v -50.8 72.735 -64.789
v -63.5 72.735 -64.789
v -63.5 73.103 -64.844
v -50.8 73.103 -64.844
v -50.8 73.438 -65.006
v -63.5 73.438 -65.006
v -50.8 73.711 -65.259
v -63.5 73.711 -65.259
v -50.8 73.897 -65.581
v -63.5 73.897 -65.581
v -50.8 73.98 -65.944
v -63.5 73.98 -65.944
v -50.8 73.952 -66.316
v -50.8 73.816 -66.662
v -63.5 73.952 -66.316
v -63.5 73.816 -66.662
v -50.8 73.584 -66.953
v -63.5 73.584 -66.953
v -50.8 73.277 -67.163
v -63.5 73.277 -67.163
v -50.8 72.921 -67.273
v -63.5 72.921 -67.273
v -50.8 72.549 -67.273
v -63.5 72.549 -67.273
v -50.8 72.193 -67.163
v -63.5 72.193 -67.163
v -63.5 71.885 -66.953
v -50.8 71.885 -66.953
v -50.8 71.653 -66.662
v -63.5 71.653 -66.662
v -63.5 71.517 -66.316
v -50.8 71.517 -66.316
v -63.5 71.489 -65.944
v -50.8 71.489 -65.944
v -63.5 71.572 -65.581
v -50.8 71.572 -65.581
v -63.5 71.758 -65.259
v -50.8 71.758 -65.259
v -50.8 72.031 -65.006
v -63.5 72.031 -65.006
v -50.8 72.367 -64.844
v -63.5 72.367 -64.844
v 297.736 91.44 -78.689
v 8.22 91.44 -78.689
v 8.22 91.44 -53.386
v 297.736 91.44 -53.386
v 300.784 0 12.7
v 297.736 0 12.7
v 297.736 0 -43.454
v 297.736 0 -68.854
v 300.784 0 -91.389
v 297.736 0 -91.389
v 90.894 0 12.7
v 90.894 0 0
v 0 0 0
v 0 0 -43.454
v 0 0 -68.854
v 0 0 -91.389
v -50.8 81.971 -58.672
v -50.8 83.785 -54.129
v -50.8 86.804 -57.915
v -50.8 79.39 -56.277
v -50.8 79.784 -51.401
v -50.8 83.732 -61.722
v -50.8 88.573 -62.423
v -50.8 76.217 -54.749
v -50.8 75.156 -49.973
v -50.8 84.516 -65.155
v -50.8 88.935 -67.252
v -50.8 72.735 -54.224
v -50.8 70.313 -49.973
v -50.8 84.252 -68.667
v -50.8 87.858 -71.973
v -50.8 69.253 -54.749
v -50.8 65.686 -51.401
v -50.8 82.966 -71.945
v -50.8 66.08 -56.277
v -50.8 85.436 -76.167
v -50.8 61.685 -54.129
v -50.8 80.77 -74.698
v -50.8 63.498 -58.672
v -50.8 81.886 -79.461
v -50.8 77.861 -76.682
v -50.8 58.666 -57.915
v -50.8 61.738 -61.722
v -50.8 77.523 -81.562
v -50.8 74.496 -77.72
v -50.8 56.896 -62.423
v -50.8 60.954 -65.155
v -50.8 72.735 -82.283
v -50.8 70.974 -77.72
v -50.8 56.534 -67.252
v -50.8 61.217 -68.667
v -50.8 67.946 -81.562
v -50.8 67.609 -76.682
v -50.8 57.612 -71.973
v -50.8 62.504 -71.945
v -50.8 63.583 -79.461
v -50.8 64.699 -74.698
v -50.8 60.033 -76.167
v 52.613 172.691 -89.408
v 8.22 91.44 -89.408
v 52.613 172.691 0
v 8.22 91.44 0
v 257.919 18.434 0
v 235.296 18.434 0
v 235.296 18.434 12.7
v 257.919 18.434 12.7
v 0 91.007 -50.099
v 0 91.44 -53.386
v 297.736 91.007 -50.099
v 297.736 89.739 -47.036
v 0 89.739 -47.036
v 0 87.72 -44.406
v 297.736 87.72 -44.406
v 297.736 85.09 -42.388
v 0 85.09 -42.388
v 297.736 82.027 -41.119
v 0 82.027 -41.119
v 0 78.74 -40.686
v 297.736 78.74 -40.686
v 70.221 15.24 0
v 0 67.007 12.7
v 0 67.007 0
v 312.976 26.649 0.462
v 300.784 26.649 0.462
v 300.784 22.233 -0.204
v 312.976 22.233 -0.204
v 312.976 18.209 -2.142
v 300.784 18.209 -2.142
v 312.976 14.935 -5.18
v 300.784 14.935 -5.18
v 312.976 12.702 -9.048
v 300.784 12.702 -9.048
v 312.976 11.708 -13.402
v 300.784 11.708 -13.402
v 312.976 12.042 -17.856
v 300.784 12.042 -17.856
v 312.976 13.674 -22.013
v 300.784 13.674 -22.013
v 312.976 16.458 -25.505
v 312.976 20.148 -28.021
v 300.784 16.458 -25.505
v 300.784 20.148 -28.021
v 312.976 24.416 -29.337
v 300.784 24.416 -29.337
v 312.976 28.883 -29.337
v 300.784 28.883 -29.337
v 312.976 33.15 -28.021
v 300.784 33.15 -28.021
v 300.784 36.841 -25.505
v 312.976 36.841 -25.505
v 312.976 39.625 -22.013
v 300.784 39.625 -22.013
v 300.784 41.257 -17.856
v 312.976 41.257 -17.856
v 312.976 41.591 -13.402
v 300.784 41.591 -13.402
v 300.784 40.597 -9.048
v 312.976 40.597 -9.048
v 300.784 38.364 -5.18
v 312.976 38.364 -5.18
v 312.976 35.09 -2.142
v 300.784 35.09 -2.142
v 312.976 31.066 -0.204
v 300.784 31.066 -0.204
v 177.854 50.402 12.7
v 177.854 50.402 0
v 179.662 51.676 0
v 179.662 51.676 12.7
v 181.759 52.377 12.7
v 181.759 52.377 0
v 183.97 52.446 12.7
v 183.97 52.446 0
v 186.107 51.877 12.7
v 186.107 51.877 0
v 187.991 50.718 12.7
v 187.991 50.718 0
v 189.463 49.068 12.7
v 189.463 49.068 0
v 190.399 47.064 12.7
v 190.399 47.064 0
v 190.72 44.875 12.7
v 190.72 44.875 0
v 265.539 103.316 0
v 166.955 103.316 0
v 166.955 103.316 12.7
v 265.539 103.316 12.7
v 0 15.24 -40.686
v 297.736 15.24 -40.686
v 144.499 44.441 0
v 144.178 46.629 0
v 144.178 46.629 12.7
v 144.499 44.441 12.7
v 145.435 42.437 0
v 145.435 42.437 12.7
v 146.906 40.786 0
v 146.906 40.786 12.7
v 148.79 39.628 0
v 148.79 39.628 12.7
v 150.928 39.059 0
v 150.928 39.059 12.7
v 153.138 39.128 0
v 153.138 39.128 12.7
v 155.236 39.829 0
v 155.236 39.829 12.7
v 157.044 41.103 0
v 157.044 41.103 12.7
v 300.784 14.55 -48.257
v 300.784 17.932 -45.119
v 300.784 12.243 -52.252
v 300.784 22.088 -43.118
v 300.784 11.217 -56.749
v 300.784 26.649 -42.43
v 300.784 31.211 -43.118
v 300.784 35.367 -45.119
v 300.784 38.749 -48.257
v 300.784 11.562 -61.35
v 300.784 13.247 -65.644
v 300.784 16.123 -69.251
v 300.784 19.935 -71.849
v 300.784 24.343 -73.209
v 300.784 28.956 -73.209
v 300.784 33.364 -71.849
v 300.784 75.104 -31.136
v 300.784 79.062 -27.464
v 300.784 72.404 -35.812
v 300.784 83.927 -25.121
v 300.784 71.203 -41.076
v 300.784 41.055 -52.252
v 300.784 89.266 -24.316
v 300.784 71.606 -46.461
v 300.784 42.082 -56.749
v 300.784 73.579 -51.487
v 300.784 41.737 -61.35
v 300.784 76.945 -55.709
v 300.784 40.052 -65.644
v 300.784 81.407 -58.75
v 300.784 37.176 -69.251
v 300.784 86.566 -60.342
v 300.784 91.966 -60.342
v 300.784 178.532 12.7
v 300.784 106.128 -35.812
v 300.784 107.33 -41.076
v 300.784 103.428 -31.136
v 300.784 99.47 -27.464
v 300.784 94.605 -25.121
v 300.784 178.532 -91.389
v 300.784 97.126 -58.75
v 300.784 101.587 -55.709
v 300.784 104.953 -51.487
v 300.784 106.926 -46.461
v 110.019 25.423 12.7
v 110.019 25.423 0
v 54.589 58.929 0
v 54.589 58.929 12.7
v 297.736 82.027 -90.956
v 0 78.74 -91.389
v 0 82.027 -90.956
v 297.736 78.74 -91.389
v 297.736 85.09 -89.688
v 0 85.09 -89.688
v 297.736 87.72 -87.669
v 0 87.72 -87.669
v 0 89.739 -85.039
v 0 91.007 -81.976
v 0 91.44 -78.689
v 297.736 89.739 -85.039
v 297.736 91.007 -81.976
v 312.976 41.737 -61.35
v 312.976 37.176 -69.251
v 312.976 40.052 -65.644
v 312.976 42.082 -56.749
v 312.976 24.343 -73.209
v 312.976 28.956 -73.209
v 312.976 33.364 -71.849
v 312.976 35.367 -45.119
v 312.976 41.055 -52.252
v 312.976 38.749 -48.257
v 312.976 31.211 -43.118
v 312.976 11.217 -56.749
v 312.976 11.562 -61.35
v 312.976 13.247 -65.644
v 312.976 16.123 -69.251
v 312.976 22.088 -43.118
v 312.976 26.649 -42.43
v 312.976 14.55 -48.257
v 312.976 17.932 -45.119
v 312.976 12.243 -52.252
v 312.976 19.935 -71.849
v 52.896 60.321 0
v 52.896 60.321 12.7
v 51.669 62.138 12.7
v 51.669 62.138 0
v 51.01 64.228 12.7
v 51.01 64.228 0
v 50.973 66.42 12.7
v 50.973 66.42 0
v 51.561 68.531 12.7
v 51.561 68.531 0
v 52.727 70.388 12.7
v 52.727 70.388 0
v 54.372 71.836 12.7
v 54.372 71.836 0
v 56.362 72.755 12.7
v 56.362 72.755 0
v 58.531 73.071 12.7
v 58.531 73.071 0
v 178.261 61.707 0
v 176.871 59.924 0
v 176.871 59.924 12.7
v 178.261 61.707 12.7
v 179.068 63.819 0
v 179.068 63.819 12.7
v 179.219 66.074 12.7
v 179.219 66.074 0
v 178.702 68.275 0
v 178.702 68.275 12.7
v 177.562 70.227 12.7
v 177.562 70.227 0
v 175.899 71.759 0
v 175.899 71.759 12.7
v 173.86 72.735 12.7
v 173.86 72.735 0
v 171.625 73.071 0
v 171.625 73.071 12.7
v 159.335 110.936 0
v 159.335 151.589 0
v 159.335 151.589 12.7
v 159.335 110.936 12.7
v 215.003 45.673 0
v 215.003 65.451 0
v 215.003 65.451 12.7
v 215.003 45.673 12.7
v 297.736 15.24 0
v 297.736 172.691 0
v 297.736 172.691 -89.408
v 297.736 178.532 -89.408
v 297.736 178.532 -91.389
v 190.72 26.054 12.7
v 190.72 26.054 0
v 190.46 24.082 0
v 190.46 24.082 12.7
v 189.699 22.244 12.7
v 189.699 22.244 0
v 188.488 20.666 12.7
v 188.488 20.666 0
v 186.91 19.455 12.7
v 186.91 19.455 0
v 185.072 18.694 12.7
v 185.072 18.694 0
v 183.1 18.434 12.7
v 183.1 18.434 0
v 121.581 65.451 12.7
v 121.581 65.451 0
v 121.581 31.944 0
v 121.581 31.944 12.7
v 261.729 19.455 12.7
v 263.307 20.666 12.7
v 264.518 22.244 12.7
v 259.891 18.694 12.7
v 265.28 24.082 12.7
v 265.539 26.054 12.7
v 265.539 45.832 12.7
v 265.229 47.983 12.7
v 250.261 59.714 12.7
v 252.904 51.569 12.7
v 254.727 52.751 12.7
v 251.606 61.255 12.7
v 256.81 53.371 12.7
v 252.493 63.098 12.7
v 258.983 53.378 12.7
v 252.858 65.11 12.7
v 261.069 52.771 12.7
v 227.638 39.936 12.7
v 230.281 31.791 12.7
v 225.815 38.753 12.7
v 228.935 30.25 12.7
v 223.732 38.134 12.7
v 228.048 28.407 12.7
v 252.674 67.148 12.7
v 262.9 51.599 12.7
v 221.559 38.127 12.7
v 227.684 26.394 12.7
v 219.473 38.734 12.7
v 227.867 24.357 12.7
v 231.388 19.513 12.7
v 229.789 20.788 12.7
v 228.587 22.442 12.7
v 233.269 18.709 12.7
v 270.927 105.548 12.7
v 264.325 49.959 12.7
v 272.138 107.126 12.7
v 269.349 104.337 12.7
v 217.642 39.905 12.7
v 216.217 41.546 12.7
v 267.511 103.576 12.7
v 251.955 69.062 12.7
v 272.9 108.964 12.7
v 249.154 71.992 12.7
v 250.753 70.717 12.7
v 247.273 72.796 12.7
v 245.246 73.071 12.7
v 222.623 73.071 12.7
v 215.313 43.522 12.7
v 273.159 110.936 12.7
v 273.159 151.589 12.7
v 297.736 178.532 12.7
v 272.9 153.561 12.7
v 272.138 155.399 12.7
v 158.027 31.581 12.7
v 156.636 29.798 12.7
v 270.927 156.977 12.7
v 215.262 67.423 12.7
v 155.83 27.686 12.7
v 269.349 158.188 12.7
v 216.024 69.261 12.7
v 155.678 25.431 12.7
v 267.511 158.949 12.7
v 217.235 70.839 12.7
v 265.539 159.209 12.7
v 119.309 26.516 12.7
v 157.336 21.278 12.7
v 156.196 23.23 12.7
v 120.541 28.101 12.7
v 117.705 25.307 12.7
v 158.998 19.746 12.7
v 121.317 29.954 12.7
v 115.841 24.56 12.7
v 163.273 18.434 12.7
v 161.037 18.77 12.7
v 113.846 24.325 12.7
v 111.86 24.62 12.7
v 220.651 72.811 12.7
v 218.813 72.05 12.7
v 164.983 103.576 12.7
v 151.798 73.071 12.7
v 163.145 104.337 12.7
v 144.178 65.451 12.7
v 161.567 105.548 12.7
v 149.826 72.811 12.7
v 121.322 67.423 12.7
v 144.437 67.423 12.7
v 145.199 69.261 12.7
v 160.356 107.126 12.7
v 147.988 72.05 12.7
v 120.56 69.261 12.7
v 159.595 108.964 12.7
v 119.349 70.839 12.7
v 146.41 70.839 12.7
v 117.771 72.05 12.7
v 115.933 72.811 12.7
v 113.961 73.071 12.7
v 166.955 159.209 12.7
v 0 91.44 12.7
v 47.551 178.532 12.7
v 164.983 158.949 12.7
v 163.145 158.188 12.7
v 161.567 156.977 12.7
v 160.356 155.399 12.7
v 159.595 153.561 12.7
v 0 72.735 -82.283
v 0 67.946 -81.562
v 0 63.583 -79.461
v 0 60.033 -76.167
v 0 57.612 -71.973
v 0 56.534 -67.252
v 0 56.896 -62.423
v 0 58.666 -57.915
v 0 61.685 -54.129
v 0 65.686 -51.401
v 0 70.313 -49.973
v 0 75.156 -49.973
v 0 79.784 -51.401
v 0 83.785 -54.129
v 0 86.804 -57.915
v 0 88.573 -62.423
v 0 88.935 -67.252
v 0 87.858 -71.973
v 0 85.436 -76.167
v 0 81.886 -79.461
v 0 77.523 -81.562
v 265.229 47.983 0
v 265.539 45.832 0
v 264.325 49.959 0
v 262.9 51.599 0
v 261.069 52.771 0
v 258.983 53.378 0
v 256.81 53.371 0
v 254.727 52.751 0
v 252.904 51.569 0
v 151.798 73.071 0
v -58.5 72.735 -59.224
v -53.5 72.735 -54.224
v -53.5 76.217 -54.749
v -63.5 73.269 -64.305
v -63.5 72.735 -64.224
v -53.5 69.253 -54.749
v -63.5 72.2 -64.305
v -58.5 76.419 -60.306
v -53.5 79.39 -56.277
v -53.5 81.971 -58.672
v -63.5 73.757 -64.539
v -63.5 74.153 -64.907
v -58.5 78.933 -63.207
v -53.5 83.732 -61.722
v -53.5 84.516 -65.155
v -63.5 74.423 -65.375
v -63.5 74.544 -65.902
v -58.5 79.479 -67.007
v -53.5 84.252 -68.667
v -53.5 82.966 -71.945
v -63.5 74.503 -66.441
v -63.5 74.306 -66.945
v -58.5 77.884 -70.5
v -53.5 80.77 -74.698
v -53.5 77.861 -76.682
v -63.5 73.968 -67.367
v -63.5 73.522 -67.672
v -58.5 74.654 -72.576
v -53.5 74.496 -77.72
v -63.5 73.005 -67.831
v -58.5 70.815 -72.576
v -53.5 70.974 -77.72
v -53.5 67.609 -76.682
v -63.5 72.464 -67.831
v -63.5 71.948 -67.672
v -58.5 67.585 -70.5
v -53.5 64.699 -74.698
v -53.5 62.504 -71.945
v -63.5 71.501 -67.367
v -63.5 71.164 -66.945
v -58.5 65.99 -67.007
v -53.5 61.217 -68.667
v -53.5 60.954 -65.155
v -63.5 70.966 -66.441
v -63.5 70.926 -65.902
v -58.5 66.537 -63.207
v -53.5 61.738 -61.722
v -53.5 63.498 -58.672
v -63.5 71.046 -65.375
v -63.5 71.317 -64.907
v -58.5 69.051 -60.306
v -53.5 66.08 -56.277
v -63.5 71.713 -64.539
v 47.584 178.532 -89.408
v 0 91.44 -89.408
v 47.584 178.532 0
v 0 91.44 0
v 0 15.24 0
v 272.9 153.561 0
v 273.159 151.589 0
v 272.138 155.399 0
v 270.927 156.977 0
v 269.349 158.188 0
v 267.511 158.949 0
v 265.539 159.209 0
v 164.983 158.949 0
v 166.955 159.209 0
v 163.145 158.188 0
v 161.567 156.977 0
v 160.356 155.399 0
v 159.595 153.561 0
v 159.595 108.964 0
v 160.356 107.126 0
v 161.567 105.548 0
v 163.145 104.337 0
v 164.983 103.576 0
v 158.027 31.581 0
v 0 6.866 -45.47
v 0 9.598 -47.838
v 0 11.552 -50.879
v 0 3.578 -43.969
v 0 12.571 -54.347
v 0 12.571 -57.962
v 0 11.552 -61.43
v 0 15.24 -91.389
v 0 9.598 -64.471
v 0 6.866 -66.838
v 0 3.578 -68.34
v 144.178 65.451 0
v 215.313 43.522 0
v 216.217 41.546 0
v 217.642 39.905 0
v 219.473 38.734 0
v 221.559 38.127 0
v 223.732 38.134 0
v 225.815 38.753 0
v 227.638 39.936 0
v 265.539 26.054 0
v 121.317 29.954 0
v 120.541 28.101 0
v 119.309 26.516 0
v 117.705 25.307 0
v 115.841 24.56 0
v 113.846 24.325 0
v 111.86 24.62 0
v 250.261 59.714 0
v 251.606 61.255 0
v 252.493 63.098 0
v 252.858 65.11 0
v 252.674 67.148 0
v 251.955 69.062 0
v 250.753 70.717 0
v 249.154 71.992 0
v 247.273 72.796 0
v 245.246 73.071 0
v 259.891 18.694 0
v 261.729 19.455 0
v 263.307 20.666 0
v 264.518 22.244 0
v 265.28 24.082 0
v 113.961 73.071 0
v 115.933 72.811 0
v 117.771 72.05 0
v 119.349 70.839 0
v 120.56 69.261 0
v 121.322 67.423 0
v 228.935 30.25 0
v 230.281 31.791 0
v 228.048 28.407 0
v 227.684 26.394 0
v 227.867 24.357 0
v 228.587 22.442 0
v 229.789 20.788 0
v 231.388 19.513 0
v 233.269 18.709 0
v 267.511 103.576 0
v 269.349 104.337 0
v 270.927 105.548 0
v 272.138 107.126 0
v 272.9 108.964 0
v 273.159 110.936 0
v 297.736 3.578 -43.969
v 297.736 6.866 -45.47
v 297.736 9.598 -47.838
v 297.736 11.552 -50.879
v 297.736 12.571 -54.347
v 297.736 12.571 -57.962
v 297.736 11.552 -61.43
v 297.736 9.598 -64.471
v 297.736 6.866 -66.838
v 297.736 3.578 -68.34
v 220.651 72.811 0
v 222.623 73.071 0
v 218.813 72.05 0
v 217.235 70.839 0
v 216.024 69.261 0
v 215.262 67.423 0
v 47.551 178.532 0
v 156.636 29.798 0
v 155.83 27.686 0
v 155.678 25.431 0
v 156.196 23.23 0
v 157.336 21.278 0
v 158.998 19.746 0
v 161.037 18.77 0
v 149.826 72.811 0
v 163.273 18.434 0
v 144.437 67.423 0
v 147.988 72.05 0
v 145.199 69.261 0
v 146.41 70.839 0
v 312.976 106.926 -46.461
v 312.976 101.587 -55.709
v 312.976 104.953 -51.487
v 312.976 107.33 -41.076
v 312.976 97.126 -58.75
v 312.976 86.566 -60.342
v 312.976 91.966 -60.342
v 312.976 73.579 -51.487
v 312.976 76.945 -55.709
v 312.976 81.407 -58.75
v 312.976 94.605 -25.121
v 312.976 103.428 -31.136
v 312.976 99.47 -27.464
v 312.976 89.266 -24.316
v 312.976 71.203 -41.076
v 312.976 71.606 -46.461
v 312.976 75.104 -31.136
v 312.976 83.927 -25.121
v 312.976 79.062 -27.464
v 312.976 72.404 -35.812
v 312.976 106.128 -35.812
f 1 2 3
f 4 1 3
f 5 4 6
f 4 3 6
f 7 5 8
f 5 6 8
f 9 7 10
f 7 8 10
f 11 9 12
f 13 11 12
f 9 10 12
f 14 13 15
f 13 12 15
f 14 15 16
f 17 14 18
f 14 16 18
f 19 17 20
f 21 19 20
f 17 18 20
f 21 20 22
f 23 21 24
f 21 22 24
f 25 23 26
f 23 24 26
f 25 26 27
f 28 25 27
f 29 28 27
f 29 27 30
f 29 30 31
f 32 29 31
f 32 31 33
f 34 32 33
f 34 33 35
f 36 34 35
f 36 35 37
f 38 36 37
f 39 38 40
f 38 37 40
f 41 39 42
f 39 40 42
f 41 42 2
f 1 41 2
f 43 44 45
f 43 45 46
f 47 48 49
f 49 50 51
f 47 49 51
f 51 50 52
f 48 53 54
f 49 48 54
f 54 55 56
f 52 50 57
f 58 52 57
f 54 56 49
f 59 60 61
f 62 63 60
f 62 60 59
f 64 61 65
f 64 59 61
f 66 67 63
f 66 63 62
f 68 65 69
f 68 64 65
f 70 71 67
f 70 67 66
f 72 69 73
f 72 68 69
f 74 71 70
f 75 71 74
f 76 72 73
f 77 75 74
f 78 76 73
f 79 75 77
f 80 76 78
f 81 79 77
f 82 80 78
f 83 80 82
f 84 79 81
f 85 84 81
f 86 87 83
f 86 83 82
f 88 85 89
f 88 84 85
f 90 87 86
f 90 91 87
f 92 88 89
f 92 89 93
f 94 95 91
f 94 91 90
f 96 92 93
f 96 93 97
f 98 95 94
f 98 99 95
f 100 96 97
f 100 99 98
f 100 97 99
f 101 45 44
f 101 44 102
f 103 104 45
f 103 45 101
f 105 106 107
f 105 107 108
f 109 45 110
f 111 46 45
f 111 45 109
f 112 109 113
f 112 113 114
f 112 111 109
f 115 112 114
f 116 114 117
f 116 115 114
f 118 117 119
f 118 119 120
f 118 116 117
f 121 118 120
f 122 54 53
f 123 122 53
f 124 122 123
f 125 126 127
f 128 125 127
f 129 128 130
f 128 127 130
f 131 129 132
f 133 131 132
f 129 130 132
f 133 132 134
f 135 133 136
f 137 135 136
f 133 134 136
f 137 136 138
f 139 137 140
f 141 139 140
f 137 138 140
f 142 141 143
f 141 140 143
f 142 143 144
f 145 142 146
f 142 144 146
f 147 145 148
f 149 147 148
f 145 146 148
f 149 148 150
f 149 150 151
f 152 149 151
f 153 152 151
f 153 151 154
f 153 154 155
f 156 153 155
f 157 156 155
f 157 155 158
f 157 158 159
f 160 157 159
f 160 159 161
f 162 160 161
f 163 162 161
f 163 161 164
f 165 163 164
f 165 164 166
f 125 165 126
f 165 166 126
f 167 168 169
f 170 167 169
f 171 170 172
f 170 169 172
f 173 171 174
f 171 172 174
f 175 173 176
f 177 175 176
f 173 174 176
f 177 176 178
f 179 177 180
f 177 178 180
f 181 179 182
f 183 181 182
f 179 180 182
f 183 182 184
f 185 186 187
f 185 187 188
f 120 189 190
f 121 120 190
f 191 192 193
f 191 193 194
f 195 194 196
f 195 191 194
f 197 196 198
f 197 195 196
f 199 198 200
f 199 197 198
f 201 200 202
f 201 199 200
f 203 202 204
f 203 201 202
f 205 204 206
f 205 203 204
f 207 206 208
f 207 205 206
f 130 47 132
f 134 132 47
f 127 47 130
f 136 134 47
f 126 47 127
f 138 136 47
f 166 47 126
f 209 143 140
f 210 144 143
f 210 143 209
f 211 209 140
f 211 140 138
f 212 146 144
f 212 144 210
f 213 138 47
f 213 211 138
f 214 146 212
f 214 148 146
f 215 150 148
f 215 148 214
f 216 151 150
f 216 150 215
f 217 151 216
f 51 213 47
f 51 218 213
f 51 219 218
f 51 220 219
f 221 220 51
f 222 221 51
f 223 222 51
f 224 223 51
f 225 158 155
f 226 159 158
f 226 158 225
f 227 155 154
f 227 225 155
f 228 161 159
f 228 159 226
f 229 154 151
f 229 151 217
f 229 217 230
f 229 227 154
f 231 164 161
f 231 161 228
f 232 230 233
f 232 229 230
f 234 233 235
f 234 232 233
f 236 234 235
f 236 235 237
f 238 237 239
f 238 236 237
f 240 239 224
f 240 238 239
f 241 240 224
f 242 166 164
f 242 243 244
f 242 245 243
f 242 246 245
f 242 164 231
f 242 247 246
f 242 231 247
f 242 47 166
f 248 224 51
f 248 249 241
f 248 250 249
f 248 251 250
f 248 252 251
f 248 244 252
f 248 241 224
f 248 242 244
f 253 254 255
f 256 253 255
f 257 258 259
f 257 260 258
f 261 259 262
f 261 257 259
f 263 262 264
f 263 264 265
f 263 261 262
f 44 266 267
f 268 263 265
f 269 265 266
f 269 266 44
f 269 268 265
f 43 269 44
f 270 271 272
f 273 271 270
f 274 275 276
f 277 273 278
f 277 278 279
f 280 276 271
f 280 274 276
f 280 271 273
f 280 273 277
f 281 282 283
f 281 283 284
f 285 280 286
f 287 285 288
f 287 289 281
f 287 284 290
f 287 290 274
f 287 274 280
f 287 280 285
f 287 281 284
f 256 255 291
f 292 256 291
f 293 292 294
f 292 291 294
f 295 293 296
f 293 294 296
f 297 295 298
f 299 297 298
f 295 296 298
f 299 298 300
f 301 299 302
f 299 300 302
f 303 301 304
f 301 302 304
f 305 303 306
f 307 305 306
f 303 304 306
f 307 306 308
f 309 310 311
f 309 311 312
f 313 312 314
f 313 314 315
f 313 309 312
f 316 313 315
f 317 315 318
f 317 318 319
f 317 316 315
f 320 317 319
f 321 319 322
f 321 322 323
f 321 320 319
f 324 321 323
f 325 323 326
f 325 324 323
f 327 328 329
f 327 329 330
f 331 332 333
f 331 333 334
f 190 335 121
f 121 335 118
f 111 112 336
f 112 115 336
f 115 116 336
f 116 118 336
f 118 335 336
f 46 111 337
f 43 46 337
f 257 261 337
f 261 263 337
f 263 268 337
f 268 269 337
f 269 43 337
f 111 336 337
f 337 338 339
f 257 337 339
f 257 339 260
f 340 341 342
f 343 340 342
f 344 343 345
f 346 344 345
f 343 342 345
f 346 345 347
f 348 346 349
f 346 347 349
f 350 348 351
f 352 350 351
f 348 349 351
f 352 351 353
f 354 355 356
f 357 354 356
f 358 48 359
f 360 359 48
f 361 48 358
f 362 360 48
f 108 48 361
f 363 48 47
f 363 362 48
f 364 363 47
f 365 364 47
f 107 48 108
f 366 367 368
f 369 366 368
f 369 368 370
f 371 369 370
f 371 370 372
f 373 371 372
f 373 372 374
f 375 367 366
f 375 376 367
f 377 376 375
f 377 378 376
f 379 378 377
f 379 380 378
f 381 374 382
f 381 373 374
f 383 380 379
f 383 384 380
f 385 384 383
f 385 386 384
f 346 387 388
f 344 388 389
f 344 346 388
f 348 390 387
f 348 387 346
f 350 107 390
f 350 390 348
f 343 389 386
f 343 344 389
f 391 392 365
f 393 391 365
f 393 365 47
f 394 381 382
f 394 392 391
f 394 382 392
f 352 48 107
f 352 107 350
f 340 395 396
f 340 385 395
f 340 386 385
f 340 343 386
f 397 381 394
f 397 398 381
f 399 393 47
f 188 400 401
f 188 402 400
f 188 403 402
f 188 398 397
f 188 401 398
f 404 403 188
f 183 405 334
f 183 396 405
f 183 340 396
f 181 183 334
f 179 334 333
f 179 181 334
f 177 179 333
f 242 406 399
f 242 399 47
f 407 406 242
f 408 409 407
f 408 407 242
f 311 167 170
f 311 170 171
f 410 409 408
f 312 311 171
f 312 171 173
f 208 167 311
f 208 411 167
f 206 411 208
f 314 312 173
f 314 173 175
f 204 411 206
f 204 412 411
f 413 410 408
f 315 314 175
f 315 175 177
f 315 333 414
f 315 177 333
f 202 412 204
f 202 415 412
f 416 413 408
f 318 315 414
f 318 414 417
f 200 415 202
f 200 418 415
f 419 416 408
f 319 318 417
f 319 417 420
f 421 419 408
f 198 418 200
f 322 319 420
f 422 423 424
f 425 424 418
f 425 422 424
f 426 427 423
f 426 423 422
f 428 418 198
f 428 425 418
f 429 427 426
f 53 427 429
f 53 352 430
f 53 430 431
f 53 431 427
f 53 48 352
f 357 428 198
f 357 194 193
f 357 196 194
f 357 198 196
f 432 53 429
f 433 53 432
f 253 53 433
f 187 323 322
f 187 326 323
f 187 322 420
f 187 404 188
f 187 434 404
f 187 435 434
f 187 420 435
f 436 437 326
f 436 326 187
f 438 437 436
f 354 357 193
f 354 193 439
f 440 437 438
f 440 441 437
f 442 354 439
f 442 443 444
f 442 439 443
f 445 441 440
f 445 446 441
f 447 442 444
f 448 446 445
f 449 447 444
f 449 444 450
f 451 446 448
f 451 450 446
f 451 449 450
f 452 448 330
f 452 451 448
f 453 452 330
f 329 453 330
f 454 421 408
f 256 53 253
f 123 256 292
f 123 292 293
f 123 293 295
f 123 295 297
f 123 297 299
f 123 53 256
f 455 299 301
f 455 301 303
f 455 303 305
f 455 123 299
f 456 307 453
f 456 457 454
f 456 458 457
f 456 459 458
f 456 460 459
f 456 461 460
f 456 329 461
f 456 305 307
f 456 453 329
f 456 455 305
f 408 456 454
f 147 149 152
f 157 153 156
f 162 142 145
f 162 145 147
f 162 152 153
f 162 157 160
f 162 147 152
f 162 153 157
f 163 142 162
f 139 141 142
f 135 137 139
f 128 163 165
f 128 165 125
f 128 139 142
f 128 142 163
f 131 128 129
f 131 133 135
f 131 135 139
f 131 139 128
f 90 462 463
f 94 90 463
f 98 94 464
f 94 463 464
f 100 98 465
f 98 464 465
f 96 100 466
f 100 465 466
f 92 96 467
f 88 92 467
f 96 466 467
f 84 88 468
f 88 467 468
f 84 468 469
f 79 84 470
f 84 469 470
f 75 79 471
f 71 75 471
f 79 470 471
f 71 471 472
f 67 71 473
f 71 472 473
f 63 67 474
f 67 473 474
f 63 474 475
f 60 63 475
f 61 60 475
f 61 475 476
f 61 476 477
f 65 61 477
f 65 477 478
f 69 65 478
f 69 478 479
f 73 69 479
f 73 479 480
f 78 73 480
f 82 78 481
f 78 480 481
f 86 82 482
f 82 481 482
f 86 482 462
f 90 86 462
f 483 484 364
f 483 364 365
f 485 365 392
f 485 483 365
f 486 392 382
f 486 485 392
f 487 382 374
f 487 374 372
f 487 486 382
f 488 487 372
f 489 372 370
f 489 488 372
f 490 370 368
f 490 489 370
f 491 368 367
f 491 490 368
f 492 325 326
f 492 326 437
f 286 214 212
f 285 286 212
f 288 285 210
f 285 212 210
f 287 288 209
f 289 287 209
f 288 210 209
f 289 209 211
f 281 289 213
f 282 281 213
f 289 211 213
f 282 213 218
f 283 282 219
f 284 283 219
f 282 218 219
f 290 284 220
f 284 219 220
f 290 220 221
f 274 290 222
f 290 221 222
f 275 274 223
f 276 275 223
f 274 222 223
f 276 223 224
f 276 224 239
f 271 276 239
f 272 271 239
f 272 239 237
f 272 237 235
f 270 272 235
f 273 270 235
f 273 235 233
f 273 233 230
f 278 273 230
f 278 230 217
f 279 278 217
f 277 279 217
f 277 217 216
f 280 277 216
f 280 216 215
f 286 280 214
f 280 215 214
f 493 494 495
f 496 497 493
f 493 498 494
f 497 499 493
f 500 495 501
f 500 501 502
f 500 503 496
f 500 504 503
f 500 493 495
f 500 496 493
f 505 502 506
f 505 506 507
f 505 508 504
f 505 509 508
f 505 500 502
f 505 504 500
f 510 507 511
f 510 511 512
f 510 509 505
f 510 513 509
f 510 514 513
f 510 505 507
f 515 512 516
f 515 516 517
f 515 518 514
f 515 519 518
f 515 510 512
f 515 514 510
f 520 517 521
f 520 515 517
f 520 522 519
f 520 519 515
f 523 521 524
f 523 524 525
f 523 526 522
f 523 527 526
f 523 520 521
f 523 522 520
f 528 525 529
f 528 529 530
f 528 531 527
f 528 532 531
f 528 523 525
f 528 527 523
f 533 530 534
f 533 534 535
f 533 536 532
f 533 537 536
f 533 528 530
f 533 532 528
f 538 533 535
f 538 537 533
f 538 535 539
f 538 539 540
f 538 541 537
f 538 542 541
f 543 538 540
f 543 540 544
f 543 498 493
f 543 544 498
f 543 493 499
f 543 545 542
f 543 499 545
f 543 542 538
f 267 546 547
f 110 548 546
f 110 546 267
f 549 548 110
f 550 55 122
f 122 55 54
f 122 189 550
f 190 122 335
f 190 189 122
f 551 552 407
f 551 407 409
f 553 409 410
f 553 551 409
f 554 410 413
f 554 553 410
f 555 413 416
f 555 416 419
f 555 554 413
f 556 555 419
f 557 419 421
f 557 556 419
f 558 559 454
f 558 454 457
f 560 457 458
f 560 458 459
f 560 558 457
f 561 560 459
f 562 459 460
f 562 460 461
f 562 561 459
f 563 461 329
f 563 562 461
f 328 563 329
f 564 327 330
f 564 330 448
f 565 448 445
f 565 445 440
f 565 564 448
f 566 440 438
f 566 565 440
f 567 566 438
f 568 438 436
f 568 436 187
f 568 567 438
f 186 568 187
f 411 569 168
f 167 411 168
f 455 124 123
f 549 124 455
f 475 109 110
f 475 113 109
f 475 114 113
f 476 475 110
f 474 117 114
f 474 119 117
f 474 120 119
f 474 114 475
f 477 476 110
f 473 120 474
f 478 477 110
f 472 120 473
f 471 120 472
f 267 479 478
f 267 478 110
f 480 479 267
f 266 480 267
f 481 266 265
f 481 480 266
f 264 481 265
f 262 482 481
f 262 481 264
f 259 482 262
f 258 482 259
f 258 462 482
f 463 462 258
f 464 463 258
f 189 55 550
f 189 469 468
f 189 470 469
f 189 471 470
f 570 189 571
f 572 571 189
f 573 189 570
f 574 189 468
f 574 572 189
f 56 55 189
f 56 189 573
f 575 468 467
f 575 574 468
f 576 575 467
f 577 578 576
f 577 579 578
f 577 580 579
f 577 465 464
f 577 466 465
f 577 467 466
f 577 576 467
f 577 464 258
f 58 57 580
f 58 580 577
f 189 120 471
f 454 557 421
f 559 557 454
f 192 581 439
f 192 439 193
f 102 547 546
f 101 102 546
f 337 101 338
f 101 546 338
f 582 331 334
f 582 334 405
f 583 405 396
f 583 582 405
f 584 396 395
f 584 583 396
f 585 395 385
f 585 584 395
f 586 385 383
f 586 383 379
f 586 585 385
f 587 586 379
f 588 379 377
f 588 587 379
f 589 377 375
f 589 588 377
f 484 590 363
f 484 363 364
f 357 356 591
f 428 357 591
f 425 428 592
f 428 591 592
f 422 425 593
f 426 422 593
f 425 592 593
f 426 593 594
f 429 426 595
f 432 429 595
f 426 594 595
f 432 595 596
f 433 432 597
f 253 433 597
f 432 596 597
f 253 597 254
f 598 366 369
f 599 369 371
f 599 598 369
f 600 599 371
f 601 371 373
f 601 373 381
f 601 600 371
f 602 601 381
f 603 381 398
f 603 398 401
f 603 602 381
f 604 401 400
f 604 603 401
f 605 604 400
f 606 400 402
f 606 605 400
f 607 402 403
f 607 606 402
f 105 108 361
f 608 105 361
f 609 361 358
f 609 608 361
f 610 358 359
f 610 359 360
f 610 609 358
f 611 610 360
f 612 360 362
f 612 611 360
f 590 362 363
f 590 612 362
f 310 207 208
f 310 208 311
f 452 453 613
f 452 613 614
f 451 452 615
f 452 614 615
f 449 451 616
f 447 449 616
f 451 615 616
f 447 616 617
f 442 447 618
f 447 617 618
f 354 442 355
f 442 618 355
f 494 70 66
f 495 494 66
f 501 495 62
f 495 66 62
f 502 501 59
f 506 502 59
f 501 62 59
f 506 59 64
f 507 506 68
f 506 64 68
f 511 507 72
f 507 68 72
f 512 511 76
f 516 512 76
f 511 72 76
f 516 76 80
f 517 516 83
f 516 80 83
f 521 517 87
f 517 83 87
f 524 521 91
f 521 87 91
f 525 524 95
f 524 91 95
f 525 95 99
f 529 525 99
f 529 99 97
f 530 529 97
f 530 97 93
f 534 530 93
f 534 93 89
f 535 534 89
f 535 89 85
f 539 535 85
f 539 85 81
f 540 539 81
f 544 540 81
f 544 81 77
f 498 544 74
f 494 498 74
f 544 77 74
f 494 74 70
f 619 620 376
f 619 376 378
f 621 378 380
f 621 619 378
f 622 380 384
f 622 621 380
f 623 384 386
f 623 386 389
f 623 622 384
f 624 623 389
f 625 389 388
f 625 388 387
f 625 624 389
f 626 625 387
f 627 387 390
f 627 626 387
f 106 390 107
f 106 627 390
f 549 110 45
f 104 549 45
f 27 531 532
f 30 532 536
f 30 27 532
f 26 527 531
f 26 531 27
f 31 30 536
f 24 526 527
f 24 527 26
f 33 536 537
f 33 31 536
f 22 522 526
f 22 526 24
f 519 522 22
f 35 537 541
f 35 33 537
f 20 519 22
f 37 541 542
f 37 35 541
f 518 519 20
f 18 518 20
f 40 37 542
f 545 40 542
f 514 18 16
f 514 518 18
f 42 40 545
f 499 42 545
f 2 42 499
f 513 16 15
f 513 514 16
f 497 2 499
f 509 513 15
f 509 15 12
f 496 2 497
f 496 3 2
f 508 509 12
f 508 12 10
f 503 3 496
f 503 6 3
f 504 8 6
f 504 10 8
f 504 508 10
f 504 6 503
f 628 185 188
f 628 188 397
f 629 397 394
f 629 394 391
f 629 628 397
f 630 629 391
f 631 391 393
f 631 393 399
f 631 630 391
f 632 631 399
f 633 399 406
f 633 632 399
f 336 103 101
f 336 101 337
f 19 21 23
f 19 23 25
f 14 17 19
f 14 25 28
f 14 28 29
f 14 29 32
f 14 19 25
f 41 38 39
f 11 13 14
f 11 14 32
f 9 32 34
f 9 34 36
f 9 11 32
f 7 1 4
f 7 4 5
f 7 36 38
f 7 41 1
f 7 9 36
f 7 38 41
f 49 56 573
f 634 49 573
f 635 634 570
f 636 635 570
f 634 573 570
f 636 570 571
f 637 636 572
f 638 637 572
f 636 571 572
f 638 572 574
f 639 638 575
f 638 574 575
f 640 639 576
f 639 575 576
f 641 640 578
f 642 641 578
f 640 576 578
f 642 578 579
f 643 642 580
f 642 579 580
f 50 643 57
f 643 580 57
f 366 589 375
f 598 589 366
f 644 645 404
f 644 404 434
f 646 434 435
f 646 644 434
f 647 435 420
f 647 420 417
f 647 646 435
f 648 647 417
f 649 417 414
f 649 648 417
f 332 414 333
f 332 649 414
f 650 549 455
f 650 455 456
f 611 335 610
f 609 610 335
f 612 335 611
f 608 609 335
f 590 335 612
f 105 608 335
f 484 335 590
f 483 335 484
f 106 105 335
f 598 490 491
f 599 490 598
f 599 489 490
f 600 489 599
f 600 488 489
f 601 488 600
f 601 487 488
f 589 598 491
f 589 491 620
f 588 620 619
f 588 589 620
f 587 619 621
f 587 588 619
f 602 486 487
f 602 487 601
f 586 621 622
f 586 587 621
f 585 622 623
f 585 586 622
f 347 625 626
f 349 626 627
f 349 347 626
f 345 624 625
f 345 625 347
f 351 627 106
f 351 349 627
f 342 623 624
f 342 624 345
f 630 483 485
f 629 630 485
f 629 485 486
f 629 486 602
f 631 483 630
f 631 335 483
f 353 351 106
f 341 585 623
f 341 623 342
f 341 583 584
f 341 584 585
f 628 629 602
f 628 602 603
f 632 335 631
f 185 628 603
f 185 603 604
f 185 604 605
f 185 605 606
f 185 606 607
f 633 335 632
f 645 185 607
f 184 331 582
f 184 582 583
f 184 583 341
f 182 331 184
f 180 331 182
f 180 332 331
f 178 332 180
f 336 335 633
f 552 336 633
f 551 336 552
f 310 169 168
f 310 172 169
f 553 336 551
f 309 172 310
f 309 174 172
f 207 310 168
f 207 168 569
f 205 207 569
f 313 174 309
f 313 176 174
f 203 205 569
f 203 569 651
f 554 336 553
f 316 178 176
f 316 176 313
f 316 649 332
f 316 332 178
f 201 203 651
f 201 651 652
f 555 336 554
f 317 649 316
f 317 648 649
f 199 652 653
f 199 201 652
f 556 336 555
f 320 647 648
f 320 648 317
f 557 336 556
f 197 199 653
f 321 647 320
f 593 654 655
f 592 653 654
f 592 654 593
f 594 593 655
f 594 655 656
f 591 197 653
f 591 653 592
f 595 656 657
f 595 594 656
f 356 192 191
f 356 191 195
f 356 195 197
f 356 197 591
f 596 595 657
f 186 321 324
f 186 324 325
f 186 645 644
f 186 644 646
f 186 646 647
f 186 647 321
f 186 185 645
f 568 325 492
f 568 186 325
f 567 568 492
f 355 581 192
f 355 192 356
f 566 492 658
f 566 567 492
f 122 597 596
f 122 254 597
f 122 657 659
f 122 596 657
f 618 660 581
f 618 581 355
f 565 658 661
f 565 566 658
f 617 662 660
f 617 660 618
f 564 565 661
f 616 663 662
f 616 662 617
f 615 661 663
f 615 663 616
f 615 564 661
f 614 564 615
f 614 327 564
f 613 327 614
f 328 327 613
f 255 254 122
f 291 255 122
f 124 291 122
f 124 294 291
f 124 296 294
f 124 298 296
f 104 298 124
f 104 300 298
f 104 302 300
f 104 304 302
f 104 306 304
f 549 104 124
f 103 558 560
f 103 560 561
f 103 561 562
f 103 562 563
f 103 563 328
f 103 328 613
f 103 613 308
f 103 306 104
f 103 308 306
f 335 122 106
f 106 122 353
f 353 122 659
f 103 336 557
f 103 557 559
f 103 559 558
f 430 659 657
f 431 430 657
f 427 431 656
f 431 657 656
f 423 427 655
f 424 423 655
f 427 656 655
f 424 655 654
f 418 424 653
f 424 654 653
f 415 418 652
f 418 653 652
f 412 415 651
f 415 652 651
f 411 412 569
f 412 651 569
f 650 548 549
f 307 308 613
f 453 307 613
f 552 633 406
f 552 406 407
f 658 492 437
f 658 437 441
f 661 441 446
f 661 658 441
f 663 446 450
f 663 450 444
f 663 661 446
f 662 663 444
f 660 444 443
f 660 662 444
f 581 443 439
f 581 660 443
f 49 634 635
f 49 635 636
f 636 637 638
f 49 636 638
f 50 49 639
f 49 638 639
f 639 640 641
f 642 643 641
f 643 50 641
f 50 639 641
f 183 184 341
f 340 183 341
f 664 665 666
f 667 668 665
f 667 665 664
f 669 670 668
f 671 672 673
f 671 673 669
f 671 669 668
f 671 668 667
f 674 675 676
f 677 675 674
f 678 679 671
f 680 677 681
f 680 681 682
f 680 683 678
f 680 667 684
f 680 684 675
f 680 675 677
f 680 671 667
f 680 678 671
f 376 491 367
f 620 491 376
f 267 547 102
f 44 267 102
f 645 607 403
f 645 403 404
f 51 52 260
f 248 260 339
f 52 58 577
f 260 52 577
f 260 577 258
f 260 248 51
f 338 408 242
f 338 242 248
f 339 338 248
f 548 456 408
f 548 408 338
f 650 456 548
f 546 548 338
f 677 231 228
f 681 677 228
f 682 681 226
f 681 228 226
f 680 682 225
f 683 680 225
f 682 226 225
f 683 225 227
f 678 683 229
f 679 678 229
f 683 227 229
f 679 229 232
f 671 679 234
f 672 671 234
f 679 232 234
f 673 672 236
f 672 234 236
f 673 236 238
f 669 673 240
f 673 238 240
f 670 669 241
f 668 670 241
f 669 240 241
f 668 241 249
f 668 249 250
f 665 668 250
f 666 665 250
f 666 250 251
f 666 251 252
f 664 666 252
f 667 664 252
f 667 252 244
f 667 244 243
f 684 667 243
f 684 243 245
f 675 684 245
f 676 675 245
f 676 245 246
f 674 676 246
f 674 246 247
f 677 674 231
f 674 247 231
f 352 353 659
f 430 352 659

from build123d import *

# Parameters (mm, degrees)
SKETCH1_W           = 297.73626
SKETCH1_H           = 182.7784
BOSS_EXTRUDE1_DEPTH = 15.24
CUT_EXTRUDE1_DEPTH  = 350.695698609
CUT_EXTRUDE2_DEPTH  = 350.695698609
SKETCH5_W           = 297.73626
SKETCH5_H           = 50.702926555
BOSS_EXTRUDE2_DEPTH = 76.2
FILLET1_R           = 12.7
FILLET2_R           = 12.7
SKETCH6_R           = 16.245750799
BOSS_EXTRUDE3_DEPTH = 50.8
SKETCH7_R           = 11.813796097
BOSS_EXTRUDE4_DEPTH = 12.7
CHAMFER1_SIZE       = 10
SKETCH8_R           = 1.248823532
CUT_EXTRUDE3_DEPTH  = 12.7
BOSS_EXTRUDE5_DEPTH = 12.7
BOSS_EXTRUDE6_DEPTH = 89.408
SKETCH11_W          = 104.0892
SKETCH11_H          = 178.532208179
BOSS_EXTRUDE7_DEPTH = 3.048
SKETCH12_R          = 15.475849778
SKETCH12_R_2        = 18.114114382
SKETCH12_R_3        = 14.983279797
BOSS_EXTRUDE8_DEPTH = 12.192


with BuildPart() as part:
    # Sketch1 → Boss-Extrude1 (new body)
    with BuildSketch(Plane(origin=(0, 0, 0), x_dir=(1, 0, 0), z_dir=(0, 1, 0))):
        with Locations((148.86813, 91.3892)):
            Rectangle(SKETCH1_W, SKETCH1_H)
    extrude(amount=BOSS_EXTRUDE1_DEPTH)

    # Sketch2 → Cut-Extrude1 (cut, through all)
    with BuildSketch(Plane.ZY):
        with BuildLine():
            ThreePointArc((-43.45432, 0), (-56.15432, 12.7), (-68.85432, 0))
            Line((-68.85432, 0), (-43.45432, 0))
        make_face()
        with BuildLine():
            ThreePointArc((-113.92408, 0), (-126.62408, 12.7), (-139.32408, 0))
            Line((-139.32408, 0), (-126.62408, 0))
            Line((-126.62408, 0), (-113.92408, 0))
        make_face()
    extrude(amount=-CUT_EXTRUDE1_DEPTH, mode=Mode.SUBTRACT)

    # Sketch4 → Cut-Extrude2 (cut, through all)
    with BuildSketch(Plane.ZY):
        with BuildLine():
            Line((-113.92408, 0), (-91.3892, 0))
            Line((-91.3892, 0), (-91.3892, 15.24))
            Line((-91.3892, 15.24), (-182.7784, 15.24))
            Line((-182.7784, 15.24), (-182.7784, 0))
            Line((-182.7784, 0), (-139.32408, 0))
            ThreePointArc((-139.32408, 0), (-126.62408, 12.7), (-113.92408, 0))
        make_face()
    extrude(amount=-CUT_EXTRUDE2_DEPTH, mode=Mode.SUBTRACT)

    # Sketch5 → Boss-Extrude2 (add)
    with BuildSketch(Plane(origin=(0, 15.24, 0), x_dir=(1, 0, 0), z_dir=(0, 1, 0))):
        with Locations((148.86813, 66.037736723)):
            Rectangle(SKETCH5_W, SKETCH5_H)
    extrude(amount=BOSS_EXTRUDE2_DEPTH)

    # Fillet1
    fillet1_edges = [part.edges().sort_by_distance(p)[0] for p in [
        (148.86813, 91.44, -91.3892),
    ]]
    fillet(fillet1_edges, radius=FILLET1_R)

    # Fillet2
    fillet2_edges = [part.edges().sort_by_distance(p)[0] for p in [
        (148.86813, 91.44, -40.686273445),
    ]]
    fillet(fillet2_edges, radius=FILLET2_R)

    # Sketch6 → Boss-Extrude3 (add)
    with BuildSketch(Plane.ZY):
        with Locations(Location((-66.037736722, 72.73477654, 0), (0, 0, 180))):
            Circle(SKETCH6_R)
    extrude(amount=BOSS_EXTRUDE3_DEPTH)

    # Sketch7 → Boss-Extrude4 (add)
    with BuildSketch(Plane.ZY.offset(50.8)):
        with Locations((-66.037736722, 72.73477654)):
            Circle(SKETCH7_R)
    extrude(amount=BOSS_EXTRUDE4_DEPTH)

    # Chamfer1
    chamfer1_edges = [part.edges().sort_by_distance(p)[0] for p in [
        (-63.5, 72.73477654, -77.851532819),
    ]]
    chamfer(chamfer1_edges, length=CHAMFER1_SIZE)

    # Sketch8 → Cut-Extrude3 (cut)
    with BuildSketch(Plane.ZY.offset(63.5)):
        with Locations((-66.037736722, 72.73477654)):
            Circle(SKETCH8_R)
    extrude(amount=-CUT_EXTRUDE3_DEPTH, mode=Mode.SUBTRACT)

    # Sketch9 → Boss-Extrude5 (add)
    with BuildSketch(Plane.XY):
        Polygon((297.73626, 0), (90.894406839, 0), (0, 67.007031279), (0, 91.44), (47.551027836, 178.532208179), (90.894406839, 178.532208179), (297.73626, 178.532208179), align=None)
        with BuildLine():
            Line((58.530996724, 73.070623488), (113.961199629, 73.070623488))
            ThreePointArc((113.961199629, 73.070623488), (119.349353302, 70.83877716), (121.581199629, 65.450623488))
            Line((121.581199629, 65.450623488), (121.581199629, 31.944306806))
            ThreePointArc((121.581199629, 31.944306806), (117.704665398, 25.307224312), (110.019293058, 25.423128034))
            Line((110.019293058, 25.423128034), (54.589090153, 58.929444715))
            ThreePointArc((54.589090153, 58.929444715), (51.190840655, 67.496719496), (58.530996724, 73.070623488))
        make_face(mode=Mode.SUBTRACT)
        with BuildLine():
            Line((265.539203866, 159.20856434), (166.955187388, 159.20856434))
            ThreePointArc((166.955187388, 159.20856434), (161.567033715, 156.976718013), (159.335187388, 151.58856434))
            Line((159.335187388, 151.58856434), (159.335187388, 110.936484564))
            ThreePointArc((159.335187388, 110.936484564), (161.567033715, 105.548330891), (166.955187388, 103.316484564))
            Line((166.955187388, 103.316484564), (265.539203866, 103.316484564))
            ThreePointArc((265.539203866, 103.316484564), (270.927357539, 105.548330891), (273.159203866, 110.936484564))
            Line((273.159203866, 110.936484564), (273.159203866, 151.58856434))
            ThreePointArc((273.159203866, 151.58856434), (270.927357539, 156.976718013), (265.539203866, 159.20856434))
        make_face(mode=Mode.SUBTRACT)
        with BuildLine():
            Line((144.177739207, 65.450623488), (144.177739207, 46.629358654))
            ThreePointArc((144.177739207, 46.629358654), (148.790363397, 39.627923749), (157.043904755, 41.102863649))
            Line((157.043904755, 41.102863649), (176.87088603, 59.924128483))
            ThreePointArc((176.87088603, 59.924128483), (178.70201841, 68.274849759), (171.624720482, 73.070623488))
            Line((171.624720482, 73.070623488), (151.797739207, 73.070623488))
            ThreePointArc((151.797739207, 73.070623488), (146.409585534, 70.83877716), (144.177739207, 65.450623488))
        make_face(mode=Mode.SUBTRACT)
        with BuildLine():
            Line((183.099865501, 18.43421436), (163.272884226, 18.43421436))
            ThreePointArc((163.272884226, 18.43421436), (156.195586298, 23.229988089), (158.026718678, 31.580709365))
            Line((158.026718678, 31.580709365), (177.853699953, 50.401974198))
            ThreePointArc((177.853699953, 50.401974198), (186.107241311, 51.876914099), (190.719865501, 44.875479193))
            Line((190.719865501, 44.875479193), (190.719865501, 26.05421436))
            ThreePointArc((190.719865501, 26.05421436), (188.488019173, 20.666060687), (183.099865501, 18.43421436))
        make_face(mode=Mode.SUBTRACT)
        with BuildLine():
            Line((215.002714002, 65.450623488), (215.002714002, 45.672508012))
            ThreePointArc((215.002714002, 45.672508012), (219.472522634, 38.734158472), (227.638066848, 39.935728791))
            Line((227.638066848, 39.935728791), (250.261137525, 59.713844266))
            ThreePointArc((250.261137525, 59.713844266), (252.379460368, 68.129255819), (245.245784679, 73.070623488))
            Line((245.245784679, 73.070623488), (222.622714002, 73.070623488))
            ThreePointArc((222.622714002, 73.070623488), (217.234560329, 70.83877716), (215.002714002, 65.450623488))
        make_face(mode=Mode.SUBTRACT)
        with BuildLine():
            Line((235.296133189, 18.43421436), (257.919203866, 18.43421436))
            ThreePointArc((257.919203866, 18.43421436), (263.307357539, 20.666060687), (265.539203866, 26.05421436))
            Line((265.539203866, 26.05421436), (265.539203866, 45.832329836))
            ThreePointArc((265.539203866, 45.832329836), (261.069395235, 52.770679376), (252.903851021, 51.569109057))
            Line((252.903851021, 51.569109057), (230.280780343, 31.790993581))
            ThreePointArc((230.280780343, 31.790993581), (228.1624575, 23.375582029), (235.296133189, 18.43421436))
        make_face(mode=Mode.SUBTRACT)
    extrude(amount=BOSS_EXTRUDE5_DEPTH)

    # Sketch10 → Boss-Extrude6 (add)
    with BuildSketch(Plane(origin=(0, 0, 0), x_dir=(-1, 0, 0), z_dir=(0, 0, -1))):
        Polygon((-47.58427569, 178.532208179), (0, 91.44), (-8.220392821, 91.44), (-52.613193371, 172.690937859), (-297.73626, 172.690937859), (-297.73626, 178.532208179), align=None)
    extrude(amount=BOSS_EXTRUDE6_DEPTH)

    # Sketch11 → Boss-Extrude7 (add)
    with BuildSketch(Plane(origin=(297.73626, 0, 0), x_dir=(0, 0, -1), z_dir=(1, 0, 0))):
        with Locations((39.3446, 89.26610409)):
            Rectangle(SKETCH11_W, SKETCH11_H)
    extrude(amount=BOSS_EXTRUDE7_DEPTH)

    # Sketch12 → Boss-Extrude8 (add)
    with BuildSketch(Plane(origin=(300.78426, 0, 0), x_dir=(0, 0, -1), z_dir=(1, 0, 0))):
        with Locations(Location((57.905976466, 26.649412399, 0), (0, 0, 180))):
            Circle(SKETCH12_R)
        with Locations(Location((42.430126688, 89.26610409, 0), (0, 0, 180))):
            Circle(SKETCH12_R_2)
        with Locations(Location((14.521554365, 26.649412399, 0), (0, 0, 180))):
            Circle(SKETCH12_R_3)
    extrude(amount=BOSS_EXTRUDE8_DEPTH)


solid = part.part
